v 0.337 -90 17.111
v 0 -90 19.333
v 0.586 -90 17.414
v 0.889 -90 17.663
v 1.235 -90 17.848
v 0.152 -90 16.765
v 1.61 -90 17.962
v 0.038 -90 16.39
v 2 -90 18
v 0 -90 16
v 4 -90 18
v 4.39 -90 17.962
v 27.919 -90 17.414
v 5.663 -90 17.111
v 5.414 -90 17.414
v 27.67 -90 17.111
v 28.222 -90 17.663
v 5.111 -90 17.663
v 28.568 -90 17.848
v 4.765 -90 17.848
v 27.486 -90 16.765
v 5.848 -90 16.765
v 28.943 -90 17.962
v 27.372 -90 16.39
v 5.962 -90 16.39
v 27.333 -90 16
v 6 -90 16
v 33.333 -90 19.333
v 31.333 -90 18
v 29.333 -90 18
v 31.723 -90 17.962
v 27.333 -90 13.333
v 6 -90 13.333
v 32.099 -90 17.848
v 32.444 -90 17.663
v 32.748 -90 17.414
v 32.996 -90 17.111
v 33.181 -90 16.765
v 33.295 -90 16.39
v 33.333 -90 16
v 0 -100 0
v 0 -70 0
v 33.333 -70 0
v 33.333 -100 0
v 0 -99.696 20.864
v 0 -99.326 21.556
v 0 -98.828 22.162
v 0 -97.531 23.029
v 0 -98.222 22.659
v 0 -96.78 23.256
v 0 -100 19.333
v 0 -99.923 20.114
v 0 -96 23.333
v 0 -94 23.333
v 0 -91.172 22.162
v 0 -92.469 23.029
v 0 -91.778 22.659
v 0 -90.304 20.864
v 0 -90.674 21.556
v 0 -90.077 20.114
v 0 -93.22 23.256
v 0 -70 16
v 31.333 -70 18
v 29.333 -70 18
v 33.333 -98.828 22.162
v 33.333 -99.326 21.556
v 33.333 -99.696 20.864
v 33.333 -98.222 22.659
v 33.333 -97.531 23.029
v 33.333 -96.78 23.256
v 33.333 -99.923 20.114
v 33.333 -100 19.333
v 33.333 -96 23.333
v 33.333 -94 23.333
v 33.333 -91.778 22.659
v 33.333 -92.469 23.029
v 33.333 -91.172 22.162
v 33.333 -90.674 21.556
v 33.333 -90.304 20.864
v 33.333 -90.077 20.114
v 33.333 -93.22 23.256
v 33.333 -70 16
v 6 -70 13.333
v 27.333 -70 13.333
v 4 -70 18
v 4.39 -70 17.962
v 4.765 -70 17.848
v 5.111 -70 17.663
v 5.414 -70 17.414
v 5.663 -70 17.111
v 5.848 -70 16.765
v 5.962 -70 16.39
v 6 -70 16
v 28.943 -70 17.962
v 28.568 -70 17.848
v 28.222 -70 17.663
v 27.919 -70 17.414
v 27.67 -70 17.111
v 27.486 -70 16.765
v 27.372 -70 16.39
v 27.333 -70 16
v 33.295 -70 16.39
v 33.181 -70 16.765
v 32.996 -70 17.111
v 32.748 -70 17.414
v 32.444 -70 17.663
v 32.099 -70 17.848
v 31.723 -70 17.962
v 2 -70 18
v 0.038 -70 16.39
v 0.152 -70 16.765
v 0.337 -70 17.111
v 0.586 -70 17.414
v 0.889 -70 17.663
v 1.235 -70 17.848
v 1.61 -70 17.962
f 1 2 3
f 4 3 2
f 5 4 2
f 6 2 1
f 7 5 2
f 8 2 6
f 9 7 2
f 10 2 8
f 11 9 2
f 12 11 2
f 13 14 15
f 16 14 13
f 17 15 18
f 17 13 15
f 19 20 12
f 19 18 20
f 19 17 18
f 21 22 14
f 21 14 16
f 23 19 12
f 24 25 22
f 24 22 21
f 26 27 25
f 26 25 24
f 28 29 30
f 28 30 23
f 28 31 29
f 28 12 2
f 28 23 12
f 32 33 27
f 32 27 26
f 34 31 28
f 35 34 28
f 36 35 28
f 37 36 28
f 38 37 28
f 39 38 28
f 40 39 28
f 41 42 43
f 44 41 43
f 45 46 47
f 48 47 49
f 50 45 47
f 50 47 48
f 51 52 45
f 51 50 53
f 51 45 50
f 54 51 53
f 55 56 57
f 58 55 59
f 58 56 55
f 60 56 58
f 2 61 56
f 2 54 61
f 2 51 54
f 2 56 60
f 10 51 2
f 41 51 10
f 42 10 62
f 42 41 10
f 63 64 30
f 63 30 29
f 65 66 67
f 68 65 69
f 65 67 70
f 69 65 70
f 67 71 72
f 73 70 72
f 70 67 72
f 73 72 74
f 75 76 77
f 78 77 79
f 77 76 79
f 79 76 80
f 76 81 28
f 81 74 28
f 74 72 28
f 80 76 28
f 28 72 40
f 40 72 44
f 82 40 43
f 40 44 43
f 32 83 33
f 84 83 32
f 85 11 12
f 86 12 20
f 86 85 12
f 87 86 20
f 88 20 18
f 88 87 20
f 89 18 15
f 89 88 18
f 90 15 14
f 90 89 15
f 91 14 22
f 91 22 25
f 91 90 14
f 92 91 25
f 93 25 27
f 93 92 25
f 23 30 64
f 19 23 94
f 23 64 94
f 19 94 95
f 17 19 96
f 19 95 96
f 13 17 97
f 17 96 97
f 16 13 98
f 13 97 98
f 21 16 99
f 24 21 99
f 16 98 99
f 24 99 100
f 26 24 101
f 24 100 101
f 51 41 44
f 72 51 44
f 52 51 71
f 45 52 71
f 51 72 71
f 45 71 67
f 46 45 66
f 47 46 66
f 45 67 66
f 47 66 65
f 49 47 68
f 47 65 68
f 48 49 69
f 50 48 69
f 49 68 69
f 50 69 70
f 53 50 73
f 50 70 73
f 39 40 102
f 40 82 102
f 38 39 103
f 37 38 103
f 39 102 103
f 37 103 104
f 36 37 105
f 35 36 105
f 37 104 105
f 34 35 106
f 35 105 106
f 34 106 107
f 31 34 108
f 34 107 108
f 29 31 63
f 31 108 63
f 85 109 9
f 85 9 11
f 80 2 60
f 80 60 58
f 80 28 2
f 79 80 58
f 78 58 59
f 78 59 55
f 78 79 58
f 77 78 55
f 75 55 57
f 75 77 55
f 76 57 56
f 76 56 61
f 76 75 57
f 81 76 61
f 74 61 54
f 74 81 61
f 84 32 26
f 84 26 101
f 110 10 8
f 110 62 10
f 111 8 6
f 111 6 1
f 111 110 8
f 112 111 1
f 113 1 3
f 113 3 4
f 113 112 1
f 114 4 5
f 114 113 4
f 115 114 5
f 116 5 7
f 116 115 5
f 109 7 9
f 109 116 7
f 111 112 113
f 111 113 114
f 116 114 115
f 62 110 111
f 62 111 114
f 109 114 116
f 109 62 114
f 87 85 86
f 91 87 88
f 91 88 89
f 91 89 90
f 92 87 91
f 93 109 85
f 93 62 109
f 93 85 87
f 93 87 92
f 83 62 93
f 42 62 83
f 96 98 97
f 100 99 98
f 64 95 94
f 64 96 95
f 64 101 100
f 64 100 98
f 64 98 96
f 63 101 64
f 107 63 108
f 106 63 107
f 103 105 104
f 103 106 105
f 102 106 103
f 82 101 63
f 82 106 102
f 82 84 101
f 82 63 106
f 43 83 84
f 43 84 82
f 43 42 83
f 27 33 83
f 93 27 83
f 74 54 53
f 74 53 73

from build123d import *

# Parameters (mm, degrees)
BOX021003023_W     = 33.3333
BOX021003023_H     = 30
BOX021003023_DEPTH = 13.3333
BOX021003025_W     = 6
BOX021003025_H     = 30
BOX021003025_DEPTH = 18
BOX021003026_W     = 6
BOX021003026_H     = 30
BOX021003026_DEPTH = 18
BOX021003020_W     = 33.3333
BOX021003020_H     = 10
BOX021003020_DEPTH = 23.3333
FILLET001_1_R      = 4
FILLET001_2_R      = 2


with BuildPart() as asiento:
    # Box021003023 → Box021003023 (new body)
    with BuildSketch(Plane.XY):
        with Locations((16.66665, 15)):
            Rectangle(BOX021003023_W, BOX021003023_H)
    extrude(amount=BOX021003023_DEPTH)


with BuildPart() as reposabrazos_izquierdo_butaca_porche:
    # Box021003025 → Box021003025 (new body)
    with BuildSketch(Plane(origin=(27.3333, 0, 0), x_dir=(1, 0, 0), z_dir=(0, 0, 1))):
        with Locations((3, 15)):
            Rectangle(BOX021003025_W, BOX021003025_H)
    extrude(amount=BOX021003025_DEPTH)


with BuildPart() as reposabrazos_derecho_butaca_porche:
    # Box021003026 → Box021003026 (new body)
    with BuildSketch(Plane.XY):
        with Locations((3, 15)):
            Rectangle(BOX021003026_W, BOX021003026_H)
    extrude(amount=BOX021003026_DEPTH)


with BuildPart() as butaca_porche:
    # Box021003020 → Box021003020 (new body)
    with BuildSketch(Plane.XY):
        with Locations((16.66665, 5)):
            Rectangle(BOX021003020_W, BOX021003020_H)
    extrude(amount=BOX021003020_DEPTH)

    # Fusion012: union Asiento, reposabrazos izquierdo butaca porche, reposabrazos derecho butaca porche
    add(asiento.part)
    add(reposabrazos_izquierdo_butaca_porche.part)
    add(reposabrazos_derecho_butaca_porche.part)

    # Fillet001 1
    fillet001_1_edges = [butaca_porche.edges().sort_by_distance(p)[0] for p in [
        (16.66665, 10, 23.3333),
        (16.66665, 0, 23.3333),
    ]]
    fillet(fillet001_1_edges, radius=FILLET001_1_R)

    # Fillet001 2
    fillet001_2_edges = [butaca_porche.edges().sort_by_distance(p)[0] for p in [
        (0, 20, 18),
        (6, 20, 18),
        (27.3333, 20, 18),
        (33.3333, 20, 18),
    ]]
    fillet(fillet001_2_edges, radius=FILLET001_2_R)


with BuildPart() as butaca_porche_1:
    # Fillet001 placement: moved
    add(butaca_porche.part.moved(Location((0, -100, 0))))


solid = butaca_porche_1.part
